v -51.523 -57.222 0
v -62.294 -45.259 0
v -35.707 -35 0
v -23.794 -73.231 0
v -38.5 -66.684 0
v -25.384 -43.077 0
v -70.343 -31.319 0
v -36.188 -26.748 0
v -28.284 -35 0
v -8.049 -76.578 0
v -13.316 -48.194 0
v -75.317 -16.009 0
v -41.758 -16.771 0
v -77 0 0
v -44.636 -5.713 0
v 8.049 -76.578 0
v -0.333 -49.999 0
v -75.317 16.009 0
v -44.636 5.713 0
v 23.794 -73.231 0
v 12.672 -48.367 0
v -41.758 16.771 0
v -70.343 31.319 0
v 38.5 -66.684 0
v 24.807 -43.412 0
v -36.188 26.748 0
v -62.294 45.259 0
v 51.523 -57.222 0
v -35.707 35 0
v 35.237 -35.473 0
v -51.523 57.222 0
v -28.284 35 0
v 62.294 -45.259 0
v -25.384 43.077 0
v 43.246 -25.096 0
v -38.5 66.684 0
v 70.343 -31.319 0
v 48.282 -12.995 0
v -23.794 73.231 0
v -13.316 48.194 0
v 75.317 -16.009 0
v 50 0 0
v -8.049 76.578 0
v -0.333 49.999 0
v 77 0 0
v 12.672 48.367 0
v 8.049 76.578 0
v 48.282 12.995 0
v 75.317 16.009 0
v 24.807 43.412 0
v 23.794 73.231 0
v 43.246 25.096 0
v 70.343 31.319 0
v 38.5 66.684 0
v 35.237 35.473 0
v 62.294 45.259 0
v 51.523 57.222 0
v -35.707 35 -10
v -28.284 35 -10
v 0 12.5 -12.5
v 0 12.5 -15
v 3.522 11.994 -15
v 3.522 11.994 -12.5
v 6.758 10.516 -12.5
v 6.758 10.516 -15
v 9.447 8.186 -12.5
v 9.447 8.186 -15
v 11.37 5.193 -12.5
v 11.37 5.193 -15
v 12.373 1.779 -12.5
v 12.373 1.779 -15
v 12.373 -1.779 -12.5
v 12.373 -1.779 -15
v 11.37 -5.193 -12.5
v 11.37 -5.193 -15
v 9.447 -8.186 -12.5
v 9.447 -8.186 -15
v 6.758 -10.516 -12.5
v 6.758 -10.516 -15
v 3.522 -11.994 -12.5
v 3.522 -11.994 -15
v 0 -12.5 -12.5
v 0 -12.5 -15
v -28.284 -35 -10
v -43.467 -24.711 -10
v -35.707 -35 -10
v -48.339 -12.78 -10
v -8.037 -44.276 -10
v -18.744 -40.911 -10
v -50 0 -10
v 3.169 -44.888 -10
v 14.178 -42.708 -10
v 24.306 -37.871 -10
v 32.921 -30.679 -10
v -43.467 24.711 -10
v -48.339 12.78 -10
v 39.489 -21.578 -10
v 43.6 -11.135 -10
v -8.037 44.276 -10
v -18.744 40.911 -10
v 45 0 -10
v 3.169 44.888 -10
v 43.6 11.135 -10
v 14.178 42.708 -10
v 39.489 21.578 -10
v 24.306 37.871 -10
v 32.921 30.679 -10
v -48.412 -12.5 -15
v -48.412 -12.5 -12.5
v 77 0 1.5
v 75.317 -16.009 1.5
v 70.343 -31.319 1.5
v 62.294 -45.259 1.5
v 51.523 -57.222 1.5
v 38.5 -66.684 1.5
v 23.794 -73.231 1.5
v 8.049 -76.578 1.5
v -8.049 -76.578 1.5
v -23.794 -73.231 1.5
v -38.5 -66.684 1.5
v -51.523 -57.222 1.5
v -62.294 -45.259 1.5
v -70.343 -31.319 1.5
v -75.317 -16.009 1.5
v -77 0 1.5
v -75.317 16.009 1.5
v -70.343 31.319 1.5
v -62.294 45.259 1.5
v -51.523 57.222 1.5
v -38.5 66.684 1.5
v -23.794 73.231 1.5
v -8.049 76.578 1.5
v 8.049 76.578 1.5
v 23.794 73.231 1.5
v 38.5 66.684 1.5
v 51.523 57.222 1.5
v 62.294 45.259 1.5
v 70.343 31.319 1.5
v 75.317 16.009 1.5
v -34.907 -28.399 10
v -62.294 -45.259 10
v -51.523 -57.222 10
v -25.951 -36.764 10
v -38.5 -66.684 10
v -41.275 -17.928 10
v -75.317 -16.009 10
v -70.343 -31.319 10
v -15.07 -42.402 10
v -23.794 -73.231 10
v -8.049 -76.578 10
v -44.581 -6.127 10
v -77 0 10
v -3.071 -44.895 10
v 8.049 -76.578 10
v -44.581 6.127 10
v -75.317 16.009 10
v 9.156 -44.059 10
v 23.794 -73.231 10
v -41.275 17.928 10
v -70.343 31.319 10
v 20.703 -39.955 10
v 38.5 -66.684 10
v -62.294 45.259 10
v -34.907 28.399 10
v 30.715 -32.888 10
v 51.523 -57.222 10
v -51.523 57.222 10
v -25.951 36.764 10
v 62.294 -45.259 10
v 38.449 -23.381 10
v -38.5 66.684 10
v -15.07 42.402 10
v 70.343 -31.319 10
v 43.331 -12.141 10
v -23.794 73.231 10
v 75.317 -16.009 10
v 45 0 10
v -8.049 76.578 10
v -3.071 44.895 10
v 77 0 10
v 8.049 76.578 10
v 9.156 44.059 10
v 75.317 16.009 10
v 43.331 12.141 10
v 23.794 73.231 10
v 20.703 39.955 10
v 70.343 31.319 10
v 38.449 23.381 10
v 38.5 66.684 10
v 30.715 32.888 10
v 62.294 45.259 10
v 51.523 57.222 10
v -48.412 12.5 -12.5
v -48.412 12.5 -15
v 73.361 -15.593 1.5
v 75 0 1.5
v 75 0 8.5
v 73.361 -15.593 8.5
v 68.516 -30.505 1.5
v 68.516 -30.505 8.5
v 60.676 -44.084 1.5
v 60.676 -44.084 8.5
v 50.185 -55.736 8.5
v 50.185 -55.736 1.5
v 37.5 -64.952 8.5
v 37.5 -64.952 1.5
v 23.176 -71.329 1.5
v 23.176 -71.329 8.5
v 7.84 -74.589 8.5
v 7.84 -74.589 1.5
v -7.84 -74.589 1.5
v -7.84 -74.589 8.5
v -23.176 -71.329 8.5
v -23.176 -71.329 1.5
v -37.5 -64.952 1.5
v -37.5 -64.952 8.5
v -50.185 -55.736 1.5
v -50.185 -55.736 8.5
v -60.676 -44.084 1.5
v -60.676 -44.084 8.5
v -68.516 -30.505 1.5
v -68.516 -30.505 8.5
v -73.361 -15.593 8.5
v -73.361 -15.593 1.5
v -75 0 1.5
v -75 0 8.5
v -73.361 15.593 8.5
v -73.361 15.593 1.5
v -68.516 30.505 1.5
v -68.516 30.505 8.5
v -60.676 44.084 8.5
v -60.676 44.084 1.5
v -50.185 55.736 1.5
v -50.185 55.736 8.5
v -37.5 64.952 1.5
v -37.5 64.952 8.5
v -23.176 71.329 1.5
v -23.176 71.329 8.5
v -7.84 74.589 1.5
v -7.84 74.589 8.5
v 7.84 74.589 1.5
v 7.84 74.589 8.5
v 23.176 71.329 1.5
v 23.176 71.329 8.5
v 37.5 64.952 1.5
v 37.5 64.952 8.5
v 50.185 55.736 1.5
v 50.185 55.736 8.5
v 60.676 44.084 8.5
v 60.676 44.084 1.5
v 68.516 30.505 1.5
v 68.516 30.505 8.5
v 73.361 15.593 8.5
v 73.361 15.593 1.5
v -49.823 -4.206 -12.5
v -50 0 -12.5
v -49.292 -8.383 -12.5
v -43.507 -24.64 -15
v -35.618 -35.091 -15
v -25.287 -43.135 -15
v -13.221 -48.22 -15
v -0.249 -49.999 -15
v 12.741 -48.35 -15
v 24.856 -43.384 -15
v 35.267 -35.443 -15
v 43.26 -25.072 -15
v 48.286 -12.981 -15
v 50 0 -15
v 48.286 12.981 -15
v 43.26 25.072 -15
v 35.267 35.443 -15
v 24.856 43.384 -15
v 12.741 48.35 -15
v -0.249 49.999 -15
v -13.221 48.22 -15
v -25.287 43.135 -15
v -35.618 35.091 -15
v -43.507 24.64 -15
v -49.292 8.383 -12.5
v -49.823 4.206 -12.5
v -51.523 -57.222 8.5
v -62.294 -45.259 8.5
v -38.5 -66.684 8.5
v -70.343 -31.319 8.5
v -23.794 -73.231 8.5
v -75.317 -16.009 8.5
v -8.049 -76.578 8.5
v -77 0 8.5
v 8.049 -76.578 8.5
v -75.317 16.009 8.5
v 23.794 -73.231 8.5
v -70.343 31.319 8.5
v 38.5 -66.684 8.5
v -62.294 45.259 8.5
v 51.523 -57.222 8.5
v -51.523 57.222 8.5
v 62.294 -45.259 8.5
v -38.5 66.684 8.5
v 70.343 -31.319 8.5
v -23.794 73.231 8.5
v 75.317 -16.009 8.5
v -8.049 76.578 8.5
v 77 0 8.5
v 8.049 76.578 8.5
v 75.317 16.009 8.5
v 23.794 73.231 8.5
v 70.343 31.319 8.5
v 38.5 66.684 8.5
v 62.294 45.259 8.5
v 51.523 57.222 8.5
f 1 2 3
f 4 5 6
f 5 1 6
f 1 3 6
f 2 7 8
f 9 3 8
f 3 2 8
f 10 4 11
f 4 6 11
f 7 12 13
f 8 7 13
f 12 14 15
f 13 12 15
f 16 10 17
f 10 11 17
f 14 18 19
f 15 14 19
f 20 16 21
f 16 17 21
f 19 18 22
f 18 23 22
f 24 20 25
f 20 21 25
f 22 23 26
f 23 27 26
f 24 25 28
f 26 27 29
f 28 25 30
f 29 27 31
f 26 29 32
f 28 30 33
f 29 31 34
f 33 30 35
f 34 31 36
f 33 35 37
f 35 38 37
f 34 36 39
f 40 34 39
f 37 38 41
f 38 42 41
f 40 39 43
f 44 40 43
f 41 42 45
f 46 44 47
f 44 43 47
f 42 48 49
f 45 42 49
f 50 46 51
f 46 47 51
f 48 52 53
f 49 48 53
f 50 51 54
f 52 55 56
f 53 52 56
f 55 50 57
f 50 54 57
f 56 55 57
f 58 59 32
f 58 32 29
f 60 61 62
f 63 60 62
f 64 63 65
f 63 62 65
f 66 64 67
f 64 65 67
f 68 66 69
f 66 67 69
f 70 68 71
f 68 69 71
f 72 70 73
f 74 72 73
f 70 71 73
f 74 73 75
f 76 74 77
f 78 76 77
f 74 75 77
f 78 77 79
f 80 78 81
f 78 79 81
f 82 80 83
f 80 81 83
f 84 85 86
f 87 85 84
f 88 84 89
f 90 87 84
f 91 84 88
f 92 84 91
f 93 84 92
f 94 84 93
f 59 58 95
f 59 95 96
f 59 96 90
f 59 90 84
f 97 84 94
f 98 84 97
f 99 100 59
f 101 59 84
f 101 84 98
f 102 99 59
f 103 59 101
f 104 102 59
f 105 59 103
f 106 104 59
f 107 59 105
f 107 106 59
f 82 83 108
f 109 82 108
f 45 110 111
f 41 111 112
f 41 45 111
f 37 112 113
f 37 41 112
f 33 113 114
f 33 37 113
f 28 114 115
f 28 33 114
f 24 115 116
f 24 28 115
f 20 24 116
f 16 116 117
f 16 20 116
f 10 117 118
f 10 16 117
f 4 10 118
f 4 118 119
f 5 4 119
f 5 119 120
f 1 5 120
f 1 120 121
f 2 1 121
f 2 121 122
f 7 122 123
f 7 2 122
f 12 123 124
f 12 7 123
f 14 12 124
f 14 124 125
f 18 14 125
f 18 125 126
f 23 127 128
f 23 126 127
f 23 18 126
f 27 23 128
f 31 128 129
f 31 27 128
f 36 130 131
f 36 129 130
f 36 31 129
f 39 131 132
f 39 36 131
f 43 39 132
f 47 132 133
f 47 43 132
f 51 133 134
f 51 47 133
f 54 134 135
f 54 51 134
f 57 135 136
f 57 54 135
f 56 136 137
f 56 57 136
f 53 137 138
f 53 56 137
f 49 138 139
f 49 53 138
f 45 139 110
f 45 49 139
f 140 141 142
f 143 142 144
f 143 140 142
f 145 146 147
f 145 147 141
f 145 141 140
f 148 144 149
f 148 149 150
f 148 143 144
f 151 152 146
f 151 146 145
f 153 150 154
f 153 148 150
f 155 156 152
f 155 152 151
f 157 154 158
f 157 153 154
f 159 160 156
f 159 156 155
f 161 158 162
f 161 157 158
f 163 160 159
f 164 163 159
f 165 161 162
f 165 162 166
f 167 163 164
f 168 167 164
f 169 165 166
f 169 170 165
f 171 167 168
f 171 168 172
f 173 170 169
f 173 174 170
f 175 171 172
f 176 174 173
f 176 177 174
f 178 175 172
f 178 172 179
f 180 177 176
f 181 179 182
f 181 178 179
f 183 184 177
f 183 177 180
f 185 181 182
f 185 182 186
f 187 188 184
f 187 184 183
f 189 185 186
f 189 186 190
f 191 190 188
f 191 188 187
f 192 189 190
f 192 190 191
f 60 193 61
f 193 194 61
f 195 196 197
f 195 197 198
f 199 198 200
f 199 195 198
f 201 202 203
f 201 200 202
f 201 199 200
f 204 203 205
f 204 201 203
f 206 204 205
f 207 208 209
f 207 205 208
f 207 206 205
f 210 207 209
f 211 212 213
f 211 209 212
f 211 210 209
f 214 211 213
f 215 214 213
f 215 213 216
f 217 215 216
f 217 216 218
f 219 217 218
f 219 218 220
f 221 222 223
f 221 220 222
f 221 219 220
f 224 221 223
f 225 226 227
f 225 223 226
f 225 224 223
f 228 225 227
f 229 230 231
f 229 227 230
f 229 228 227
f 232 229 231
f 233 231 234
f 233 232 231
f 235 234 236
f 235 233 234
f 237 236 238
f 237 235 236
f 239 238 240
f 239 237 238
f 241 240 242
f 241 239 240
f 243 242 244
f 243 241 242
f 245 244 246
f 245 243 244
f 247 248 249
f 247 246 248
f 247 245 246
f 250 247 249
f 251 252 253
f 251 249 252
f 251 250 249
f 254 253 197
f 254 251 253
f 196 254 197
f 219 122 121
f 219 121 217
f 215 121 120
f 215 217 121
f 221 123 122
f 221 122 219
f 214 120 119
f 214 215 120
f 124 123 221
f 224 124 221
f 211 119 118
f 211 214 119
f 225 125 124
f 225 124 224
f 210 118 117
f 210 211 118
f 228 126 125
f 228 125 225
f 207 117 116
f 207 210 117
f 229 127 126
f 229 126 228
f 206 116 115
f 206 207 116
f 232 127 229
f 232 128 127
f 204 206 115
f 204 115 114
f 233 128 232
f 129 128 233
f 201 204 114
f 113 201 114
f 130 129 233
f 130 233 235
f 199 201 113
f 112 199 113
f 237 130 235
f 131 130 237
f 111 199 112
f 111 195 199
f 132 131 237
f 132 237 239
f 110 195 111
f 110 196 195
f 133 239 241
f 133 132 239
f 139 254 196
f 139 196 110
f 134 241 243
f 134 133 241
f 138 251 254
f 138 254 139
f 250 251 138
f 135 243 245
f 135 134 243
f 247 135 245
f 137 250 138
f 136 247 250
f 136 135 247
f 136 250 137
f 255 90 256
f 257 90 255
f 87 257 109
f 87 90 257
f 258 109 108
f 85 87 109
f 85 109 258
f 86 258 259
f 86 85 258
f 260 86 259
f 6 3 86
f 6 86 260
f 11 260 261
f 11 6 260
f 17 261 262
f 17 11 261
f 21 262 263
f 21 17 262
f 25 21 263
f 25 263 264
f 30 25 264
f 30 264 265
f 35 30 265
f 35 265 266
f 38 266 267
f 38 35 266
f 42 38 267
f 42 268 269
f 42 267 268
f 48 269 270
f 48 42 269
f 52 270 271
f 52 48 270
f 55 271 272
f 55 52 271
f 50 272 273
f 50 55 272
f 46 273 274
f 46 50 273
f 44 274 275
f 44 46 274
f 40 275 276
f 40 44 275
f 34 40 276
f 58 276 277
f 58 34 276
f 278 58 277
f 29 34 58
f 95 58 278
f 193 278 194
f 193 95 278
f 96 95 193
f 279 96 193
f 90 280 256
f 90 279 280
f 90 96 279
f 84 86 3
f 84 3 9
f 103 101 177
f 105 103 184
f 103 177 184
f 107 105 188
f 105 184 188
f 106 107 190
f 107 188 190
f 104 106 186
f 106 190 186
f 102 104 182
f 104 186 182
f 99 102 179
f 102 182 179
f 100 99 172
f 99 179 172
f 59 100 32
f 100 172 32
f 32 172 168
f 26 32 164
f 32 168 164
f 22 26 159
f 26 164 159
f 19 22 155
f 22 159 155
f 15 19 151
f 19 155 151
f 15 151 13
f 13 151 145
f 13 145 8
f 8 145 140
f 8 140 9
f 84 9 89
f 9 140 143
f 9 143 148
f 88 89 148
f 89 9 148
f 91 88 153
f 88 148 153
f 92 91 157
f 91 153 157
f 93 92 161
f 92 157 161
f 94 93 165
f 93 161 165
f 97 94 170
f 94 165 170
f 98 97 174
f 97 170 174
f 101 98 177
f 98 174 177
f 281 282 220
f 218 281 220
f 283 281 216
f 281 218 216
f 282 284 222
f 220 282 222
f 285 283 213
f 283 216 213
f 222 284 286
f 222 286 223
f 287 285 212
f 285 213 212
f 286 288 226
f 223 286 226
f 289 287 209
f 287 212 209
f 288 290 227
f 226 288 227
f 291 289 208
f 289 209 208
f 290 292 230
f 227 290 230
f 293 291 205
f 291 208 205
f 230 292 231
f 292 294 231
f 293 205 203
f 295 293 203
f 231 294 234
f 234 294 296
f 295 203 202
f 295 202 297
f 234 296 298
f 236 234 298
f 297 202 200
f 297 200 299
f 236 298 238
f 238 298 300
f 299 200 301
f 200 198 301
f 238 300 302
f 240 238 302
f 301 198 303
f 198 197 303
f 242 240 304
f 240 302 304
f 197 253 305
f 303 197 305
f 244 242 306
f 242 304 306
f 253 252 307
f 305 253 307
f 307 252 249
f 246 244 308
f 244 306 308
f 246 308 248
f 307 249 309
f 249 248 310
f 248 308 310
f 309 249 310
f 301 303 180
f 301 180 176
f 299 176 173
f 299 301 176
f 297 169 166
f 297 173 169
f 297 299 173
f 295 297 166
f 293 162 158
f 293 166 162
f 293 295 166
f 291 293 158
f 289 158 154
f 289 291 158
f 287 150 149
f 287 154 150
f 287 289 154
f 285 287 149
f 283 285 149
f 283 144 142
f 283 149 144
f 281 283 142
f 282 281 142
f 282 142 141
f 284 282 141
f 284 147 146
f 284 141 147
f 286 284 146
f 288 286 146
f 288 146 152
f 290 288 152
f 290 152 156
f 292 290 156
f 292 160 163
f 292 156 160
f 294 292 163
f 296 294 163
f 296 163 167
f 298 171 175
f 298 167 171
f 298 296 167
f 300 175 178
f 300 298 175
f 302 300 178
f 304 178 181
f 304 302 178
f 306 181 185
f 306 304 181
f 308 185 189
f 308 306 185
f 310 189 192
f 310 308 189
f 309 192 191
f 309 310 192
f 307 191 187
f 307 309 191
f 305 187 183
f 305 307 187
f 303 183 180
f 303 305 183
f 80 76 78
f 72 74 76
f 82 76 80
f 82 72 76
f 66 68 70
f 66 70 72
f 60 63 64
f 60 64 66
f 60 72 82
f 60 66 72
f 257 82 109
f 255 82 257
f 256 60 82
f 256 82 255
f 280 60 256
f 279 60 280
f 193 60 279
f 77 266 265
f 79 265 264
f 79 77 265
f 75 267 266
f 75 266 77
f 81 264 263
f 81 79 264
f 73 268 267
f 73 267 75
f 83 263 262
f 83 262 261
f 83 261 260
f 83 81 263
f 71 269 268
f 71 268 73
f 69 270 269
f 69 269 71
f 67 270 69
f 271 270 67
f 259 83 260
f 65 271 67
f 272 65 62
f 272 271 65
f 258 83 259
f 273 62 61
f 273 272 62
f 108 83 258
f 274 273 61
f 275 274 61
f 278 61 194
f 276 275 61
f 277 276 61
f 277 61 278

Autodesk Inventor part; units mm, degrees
ref_plane "YZ Plane" through (0, 0, 0) normal (1, 0, 0) x (0, 1, 0)
ref_plane "XZ Plane" through (0, 0, 0) normal (0, 1, 0) x (-1, 0, 0)
ref_plane "XY Plane" through (0, 0, 0) normal (0, 0, 1) x (1, 0, 0)
sketch "Sketch1" plane through (0, 0, 0) normal (0, 0, 1) x (1, 0, 0)
  circle A0 centre (0, 0) radius 77
  dimension "d0" = 154
extrude "Extrusion1" add sketch "Sketch1" along normal blind 1.5
sketch "Sketch2" plane through (0, 0, 1.5) normal (0, 0, 1) x (1, 0, 0)
  circle A0 centre (0, 0) radius 77 projected
  circle A1 centre (0, 0) radius 75
  dimension "d4" = 150
extrude "Extrusion2" add sketch "Sketch2" along normal blind 7 contours A1
sketch "Sketch3" plane through (0, 0, 8.5) normal (0, 0, 1) x (1, 0, 0)
  circle A0 centre (0, 0) radius 77 projected
extrude "Extrusion3" add sketch "Sketch3" along normal blind 1.5
sketch "Sketch5" plane through (0, 0, 0) normal (0, 0, -1) x (-1, 0, 0)
  circle A0 centre (0, 0) radius 77 projected
  circle A1 centre (0, 0) radius 50
  dimension "d14" = 100
extrude "Extrusion5" add sketch "Sketch5" along normal blind 15 contours A1
sketch "Sketch6" plane through (0, 0, -15) normal (0, 0, -1) x (-1, 0, 0)
  circle A0 centre (0, 0) radius 50 projected
  line L0 (48.4123, 12.5) -> (0, 12.5)
  arc A1 (0, 12.5) -> (0, -12.5) centre (0, 0) ccw
  line L1 (0, -12.5) -> (48.4123, -12.5)
  dimension "d18" = 25
extrude "Extrusion6" cut sketch "Sketch6" against normal blind 2.5 contours A0 L1 A1 L0 picked at (16.6667, 0)
sketch "Sketch7" plane through (0, 0, 10) normal (0, 0, 1) x (1, 0, 0)
  circle A0 centre (0, 0) radius 77 projected
  circle A1 centre (0, 0) radius 45
  dimension "d22" = 90
extrude "Extrusion7" cut sketch "Sketch7" against normal blind 20 contours A1
sketch "Sketch8" plane through (0, 0, -10) normal (0, 0, 1) x (1, 0, 0)
  circle A0 centre (0, 0) radius 45 projected
  line L0 (0, 35) -> (-105.83, 35)
  line L1 (-105.83, 35) -> (-105.83, -35)
  line L2 (-105.83, -35) -> (0, -35)
  arc A1 (0, -35) -> (0, 35) centre (0, 0) ccw
  dimension "d26" = 70
extrude "Extrusion8" cut sketch "Sketch8" along normal up to surface (10 mm away) contours L0 A1 L2 A0 | A0 L2 L1 L0 picked at (-14.9265, 1.4828)
properties part number "proximal drive pulley"
